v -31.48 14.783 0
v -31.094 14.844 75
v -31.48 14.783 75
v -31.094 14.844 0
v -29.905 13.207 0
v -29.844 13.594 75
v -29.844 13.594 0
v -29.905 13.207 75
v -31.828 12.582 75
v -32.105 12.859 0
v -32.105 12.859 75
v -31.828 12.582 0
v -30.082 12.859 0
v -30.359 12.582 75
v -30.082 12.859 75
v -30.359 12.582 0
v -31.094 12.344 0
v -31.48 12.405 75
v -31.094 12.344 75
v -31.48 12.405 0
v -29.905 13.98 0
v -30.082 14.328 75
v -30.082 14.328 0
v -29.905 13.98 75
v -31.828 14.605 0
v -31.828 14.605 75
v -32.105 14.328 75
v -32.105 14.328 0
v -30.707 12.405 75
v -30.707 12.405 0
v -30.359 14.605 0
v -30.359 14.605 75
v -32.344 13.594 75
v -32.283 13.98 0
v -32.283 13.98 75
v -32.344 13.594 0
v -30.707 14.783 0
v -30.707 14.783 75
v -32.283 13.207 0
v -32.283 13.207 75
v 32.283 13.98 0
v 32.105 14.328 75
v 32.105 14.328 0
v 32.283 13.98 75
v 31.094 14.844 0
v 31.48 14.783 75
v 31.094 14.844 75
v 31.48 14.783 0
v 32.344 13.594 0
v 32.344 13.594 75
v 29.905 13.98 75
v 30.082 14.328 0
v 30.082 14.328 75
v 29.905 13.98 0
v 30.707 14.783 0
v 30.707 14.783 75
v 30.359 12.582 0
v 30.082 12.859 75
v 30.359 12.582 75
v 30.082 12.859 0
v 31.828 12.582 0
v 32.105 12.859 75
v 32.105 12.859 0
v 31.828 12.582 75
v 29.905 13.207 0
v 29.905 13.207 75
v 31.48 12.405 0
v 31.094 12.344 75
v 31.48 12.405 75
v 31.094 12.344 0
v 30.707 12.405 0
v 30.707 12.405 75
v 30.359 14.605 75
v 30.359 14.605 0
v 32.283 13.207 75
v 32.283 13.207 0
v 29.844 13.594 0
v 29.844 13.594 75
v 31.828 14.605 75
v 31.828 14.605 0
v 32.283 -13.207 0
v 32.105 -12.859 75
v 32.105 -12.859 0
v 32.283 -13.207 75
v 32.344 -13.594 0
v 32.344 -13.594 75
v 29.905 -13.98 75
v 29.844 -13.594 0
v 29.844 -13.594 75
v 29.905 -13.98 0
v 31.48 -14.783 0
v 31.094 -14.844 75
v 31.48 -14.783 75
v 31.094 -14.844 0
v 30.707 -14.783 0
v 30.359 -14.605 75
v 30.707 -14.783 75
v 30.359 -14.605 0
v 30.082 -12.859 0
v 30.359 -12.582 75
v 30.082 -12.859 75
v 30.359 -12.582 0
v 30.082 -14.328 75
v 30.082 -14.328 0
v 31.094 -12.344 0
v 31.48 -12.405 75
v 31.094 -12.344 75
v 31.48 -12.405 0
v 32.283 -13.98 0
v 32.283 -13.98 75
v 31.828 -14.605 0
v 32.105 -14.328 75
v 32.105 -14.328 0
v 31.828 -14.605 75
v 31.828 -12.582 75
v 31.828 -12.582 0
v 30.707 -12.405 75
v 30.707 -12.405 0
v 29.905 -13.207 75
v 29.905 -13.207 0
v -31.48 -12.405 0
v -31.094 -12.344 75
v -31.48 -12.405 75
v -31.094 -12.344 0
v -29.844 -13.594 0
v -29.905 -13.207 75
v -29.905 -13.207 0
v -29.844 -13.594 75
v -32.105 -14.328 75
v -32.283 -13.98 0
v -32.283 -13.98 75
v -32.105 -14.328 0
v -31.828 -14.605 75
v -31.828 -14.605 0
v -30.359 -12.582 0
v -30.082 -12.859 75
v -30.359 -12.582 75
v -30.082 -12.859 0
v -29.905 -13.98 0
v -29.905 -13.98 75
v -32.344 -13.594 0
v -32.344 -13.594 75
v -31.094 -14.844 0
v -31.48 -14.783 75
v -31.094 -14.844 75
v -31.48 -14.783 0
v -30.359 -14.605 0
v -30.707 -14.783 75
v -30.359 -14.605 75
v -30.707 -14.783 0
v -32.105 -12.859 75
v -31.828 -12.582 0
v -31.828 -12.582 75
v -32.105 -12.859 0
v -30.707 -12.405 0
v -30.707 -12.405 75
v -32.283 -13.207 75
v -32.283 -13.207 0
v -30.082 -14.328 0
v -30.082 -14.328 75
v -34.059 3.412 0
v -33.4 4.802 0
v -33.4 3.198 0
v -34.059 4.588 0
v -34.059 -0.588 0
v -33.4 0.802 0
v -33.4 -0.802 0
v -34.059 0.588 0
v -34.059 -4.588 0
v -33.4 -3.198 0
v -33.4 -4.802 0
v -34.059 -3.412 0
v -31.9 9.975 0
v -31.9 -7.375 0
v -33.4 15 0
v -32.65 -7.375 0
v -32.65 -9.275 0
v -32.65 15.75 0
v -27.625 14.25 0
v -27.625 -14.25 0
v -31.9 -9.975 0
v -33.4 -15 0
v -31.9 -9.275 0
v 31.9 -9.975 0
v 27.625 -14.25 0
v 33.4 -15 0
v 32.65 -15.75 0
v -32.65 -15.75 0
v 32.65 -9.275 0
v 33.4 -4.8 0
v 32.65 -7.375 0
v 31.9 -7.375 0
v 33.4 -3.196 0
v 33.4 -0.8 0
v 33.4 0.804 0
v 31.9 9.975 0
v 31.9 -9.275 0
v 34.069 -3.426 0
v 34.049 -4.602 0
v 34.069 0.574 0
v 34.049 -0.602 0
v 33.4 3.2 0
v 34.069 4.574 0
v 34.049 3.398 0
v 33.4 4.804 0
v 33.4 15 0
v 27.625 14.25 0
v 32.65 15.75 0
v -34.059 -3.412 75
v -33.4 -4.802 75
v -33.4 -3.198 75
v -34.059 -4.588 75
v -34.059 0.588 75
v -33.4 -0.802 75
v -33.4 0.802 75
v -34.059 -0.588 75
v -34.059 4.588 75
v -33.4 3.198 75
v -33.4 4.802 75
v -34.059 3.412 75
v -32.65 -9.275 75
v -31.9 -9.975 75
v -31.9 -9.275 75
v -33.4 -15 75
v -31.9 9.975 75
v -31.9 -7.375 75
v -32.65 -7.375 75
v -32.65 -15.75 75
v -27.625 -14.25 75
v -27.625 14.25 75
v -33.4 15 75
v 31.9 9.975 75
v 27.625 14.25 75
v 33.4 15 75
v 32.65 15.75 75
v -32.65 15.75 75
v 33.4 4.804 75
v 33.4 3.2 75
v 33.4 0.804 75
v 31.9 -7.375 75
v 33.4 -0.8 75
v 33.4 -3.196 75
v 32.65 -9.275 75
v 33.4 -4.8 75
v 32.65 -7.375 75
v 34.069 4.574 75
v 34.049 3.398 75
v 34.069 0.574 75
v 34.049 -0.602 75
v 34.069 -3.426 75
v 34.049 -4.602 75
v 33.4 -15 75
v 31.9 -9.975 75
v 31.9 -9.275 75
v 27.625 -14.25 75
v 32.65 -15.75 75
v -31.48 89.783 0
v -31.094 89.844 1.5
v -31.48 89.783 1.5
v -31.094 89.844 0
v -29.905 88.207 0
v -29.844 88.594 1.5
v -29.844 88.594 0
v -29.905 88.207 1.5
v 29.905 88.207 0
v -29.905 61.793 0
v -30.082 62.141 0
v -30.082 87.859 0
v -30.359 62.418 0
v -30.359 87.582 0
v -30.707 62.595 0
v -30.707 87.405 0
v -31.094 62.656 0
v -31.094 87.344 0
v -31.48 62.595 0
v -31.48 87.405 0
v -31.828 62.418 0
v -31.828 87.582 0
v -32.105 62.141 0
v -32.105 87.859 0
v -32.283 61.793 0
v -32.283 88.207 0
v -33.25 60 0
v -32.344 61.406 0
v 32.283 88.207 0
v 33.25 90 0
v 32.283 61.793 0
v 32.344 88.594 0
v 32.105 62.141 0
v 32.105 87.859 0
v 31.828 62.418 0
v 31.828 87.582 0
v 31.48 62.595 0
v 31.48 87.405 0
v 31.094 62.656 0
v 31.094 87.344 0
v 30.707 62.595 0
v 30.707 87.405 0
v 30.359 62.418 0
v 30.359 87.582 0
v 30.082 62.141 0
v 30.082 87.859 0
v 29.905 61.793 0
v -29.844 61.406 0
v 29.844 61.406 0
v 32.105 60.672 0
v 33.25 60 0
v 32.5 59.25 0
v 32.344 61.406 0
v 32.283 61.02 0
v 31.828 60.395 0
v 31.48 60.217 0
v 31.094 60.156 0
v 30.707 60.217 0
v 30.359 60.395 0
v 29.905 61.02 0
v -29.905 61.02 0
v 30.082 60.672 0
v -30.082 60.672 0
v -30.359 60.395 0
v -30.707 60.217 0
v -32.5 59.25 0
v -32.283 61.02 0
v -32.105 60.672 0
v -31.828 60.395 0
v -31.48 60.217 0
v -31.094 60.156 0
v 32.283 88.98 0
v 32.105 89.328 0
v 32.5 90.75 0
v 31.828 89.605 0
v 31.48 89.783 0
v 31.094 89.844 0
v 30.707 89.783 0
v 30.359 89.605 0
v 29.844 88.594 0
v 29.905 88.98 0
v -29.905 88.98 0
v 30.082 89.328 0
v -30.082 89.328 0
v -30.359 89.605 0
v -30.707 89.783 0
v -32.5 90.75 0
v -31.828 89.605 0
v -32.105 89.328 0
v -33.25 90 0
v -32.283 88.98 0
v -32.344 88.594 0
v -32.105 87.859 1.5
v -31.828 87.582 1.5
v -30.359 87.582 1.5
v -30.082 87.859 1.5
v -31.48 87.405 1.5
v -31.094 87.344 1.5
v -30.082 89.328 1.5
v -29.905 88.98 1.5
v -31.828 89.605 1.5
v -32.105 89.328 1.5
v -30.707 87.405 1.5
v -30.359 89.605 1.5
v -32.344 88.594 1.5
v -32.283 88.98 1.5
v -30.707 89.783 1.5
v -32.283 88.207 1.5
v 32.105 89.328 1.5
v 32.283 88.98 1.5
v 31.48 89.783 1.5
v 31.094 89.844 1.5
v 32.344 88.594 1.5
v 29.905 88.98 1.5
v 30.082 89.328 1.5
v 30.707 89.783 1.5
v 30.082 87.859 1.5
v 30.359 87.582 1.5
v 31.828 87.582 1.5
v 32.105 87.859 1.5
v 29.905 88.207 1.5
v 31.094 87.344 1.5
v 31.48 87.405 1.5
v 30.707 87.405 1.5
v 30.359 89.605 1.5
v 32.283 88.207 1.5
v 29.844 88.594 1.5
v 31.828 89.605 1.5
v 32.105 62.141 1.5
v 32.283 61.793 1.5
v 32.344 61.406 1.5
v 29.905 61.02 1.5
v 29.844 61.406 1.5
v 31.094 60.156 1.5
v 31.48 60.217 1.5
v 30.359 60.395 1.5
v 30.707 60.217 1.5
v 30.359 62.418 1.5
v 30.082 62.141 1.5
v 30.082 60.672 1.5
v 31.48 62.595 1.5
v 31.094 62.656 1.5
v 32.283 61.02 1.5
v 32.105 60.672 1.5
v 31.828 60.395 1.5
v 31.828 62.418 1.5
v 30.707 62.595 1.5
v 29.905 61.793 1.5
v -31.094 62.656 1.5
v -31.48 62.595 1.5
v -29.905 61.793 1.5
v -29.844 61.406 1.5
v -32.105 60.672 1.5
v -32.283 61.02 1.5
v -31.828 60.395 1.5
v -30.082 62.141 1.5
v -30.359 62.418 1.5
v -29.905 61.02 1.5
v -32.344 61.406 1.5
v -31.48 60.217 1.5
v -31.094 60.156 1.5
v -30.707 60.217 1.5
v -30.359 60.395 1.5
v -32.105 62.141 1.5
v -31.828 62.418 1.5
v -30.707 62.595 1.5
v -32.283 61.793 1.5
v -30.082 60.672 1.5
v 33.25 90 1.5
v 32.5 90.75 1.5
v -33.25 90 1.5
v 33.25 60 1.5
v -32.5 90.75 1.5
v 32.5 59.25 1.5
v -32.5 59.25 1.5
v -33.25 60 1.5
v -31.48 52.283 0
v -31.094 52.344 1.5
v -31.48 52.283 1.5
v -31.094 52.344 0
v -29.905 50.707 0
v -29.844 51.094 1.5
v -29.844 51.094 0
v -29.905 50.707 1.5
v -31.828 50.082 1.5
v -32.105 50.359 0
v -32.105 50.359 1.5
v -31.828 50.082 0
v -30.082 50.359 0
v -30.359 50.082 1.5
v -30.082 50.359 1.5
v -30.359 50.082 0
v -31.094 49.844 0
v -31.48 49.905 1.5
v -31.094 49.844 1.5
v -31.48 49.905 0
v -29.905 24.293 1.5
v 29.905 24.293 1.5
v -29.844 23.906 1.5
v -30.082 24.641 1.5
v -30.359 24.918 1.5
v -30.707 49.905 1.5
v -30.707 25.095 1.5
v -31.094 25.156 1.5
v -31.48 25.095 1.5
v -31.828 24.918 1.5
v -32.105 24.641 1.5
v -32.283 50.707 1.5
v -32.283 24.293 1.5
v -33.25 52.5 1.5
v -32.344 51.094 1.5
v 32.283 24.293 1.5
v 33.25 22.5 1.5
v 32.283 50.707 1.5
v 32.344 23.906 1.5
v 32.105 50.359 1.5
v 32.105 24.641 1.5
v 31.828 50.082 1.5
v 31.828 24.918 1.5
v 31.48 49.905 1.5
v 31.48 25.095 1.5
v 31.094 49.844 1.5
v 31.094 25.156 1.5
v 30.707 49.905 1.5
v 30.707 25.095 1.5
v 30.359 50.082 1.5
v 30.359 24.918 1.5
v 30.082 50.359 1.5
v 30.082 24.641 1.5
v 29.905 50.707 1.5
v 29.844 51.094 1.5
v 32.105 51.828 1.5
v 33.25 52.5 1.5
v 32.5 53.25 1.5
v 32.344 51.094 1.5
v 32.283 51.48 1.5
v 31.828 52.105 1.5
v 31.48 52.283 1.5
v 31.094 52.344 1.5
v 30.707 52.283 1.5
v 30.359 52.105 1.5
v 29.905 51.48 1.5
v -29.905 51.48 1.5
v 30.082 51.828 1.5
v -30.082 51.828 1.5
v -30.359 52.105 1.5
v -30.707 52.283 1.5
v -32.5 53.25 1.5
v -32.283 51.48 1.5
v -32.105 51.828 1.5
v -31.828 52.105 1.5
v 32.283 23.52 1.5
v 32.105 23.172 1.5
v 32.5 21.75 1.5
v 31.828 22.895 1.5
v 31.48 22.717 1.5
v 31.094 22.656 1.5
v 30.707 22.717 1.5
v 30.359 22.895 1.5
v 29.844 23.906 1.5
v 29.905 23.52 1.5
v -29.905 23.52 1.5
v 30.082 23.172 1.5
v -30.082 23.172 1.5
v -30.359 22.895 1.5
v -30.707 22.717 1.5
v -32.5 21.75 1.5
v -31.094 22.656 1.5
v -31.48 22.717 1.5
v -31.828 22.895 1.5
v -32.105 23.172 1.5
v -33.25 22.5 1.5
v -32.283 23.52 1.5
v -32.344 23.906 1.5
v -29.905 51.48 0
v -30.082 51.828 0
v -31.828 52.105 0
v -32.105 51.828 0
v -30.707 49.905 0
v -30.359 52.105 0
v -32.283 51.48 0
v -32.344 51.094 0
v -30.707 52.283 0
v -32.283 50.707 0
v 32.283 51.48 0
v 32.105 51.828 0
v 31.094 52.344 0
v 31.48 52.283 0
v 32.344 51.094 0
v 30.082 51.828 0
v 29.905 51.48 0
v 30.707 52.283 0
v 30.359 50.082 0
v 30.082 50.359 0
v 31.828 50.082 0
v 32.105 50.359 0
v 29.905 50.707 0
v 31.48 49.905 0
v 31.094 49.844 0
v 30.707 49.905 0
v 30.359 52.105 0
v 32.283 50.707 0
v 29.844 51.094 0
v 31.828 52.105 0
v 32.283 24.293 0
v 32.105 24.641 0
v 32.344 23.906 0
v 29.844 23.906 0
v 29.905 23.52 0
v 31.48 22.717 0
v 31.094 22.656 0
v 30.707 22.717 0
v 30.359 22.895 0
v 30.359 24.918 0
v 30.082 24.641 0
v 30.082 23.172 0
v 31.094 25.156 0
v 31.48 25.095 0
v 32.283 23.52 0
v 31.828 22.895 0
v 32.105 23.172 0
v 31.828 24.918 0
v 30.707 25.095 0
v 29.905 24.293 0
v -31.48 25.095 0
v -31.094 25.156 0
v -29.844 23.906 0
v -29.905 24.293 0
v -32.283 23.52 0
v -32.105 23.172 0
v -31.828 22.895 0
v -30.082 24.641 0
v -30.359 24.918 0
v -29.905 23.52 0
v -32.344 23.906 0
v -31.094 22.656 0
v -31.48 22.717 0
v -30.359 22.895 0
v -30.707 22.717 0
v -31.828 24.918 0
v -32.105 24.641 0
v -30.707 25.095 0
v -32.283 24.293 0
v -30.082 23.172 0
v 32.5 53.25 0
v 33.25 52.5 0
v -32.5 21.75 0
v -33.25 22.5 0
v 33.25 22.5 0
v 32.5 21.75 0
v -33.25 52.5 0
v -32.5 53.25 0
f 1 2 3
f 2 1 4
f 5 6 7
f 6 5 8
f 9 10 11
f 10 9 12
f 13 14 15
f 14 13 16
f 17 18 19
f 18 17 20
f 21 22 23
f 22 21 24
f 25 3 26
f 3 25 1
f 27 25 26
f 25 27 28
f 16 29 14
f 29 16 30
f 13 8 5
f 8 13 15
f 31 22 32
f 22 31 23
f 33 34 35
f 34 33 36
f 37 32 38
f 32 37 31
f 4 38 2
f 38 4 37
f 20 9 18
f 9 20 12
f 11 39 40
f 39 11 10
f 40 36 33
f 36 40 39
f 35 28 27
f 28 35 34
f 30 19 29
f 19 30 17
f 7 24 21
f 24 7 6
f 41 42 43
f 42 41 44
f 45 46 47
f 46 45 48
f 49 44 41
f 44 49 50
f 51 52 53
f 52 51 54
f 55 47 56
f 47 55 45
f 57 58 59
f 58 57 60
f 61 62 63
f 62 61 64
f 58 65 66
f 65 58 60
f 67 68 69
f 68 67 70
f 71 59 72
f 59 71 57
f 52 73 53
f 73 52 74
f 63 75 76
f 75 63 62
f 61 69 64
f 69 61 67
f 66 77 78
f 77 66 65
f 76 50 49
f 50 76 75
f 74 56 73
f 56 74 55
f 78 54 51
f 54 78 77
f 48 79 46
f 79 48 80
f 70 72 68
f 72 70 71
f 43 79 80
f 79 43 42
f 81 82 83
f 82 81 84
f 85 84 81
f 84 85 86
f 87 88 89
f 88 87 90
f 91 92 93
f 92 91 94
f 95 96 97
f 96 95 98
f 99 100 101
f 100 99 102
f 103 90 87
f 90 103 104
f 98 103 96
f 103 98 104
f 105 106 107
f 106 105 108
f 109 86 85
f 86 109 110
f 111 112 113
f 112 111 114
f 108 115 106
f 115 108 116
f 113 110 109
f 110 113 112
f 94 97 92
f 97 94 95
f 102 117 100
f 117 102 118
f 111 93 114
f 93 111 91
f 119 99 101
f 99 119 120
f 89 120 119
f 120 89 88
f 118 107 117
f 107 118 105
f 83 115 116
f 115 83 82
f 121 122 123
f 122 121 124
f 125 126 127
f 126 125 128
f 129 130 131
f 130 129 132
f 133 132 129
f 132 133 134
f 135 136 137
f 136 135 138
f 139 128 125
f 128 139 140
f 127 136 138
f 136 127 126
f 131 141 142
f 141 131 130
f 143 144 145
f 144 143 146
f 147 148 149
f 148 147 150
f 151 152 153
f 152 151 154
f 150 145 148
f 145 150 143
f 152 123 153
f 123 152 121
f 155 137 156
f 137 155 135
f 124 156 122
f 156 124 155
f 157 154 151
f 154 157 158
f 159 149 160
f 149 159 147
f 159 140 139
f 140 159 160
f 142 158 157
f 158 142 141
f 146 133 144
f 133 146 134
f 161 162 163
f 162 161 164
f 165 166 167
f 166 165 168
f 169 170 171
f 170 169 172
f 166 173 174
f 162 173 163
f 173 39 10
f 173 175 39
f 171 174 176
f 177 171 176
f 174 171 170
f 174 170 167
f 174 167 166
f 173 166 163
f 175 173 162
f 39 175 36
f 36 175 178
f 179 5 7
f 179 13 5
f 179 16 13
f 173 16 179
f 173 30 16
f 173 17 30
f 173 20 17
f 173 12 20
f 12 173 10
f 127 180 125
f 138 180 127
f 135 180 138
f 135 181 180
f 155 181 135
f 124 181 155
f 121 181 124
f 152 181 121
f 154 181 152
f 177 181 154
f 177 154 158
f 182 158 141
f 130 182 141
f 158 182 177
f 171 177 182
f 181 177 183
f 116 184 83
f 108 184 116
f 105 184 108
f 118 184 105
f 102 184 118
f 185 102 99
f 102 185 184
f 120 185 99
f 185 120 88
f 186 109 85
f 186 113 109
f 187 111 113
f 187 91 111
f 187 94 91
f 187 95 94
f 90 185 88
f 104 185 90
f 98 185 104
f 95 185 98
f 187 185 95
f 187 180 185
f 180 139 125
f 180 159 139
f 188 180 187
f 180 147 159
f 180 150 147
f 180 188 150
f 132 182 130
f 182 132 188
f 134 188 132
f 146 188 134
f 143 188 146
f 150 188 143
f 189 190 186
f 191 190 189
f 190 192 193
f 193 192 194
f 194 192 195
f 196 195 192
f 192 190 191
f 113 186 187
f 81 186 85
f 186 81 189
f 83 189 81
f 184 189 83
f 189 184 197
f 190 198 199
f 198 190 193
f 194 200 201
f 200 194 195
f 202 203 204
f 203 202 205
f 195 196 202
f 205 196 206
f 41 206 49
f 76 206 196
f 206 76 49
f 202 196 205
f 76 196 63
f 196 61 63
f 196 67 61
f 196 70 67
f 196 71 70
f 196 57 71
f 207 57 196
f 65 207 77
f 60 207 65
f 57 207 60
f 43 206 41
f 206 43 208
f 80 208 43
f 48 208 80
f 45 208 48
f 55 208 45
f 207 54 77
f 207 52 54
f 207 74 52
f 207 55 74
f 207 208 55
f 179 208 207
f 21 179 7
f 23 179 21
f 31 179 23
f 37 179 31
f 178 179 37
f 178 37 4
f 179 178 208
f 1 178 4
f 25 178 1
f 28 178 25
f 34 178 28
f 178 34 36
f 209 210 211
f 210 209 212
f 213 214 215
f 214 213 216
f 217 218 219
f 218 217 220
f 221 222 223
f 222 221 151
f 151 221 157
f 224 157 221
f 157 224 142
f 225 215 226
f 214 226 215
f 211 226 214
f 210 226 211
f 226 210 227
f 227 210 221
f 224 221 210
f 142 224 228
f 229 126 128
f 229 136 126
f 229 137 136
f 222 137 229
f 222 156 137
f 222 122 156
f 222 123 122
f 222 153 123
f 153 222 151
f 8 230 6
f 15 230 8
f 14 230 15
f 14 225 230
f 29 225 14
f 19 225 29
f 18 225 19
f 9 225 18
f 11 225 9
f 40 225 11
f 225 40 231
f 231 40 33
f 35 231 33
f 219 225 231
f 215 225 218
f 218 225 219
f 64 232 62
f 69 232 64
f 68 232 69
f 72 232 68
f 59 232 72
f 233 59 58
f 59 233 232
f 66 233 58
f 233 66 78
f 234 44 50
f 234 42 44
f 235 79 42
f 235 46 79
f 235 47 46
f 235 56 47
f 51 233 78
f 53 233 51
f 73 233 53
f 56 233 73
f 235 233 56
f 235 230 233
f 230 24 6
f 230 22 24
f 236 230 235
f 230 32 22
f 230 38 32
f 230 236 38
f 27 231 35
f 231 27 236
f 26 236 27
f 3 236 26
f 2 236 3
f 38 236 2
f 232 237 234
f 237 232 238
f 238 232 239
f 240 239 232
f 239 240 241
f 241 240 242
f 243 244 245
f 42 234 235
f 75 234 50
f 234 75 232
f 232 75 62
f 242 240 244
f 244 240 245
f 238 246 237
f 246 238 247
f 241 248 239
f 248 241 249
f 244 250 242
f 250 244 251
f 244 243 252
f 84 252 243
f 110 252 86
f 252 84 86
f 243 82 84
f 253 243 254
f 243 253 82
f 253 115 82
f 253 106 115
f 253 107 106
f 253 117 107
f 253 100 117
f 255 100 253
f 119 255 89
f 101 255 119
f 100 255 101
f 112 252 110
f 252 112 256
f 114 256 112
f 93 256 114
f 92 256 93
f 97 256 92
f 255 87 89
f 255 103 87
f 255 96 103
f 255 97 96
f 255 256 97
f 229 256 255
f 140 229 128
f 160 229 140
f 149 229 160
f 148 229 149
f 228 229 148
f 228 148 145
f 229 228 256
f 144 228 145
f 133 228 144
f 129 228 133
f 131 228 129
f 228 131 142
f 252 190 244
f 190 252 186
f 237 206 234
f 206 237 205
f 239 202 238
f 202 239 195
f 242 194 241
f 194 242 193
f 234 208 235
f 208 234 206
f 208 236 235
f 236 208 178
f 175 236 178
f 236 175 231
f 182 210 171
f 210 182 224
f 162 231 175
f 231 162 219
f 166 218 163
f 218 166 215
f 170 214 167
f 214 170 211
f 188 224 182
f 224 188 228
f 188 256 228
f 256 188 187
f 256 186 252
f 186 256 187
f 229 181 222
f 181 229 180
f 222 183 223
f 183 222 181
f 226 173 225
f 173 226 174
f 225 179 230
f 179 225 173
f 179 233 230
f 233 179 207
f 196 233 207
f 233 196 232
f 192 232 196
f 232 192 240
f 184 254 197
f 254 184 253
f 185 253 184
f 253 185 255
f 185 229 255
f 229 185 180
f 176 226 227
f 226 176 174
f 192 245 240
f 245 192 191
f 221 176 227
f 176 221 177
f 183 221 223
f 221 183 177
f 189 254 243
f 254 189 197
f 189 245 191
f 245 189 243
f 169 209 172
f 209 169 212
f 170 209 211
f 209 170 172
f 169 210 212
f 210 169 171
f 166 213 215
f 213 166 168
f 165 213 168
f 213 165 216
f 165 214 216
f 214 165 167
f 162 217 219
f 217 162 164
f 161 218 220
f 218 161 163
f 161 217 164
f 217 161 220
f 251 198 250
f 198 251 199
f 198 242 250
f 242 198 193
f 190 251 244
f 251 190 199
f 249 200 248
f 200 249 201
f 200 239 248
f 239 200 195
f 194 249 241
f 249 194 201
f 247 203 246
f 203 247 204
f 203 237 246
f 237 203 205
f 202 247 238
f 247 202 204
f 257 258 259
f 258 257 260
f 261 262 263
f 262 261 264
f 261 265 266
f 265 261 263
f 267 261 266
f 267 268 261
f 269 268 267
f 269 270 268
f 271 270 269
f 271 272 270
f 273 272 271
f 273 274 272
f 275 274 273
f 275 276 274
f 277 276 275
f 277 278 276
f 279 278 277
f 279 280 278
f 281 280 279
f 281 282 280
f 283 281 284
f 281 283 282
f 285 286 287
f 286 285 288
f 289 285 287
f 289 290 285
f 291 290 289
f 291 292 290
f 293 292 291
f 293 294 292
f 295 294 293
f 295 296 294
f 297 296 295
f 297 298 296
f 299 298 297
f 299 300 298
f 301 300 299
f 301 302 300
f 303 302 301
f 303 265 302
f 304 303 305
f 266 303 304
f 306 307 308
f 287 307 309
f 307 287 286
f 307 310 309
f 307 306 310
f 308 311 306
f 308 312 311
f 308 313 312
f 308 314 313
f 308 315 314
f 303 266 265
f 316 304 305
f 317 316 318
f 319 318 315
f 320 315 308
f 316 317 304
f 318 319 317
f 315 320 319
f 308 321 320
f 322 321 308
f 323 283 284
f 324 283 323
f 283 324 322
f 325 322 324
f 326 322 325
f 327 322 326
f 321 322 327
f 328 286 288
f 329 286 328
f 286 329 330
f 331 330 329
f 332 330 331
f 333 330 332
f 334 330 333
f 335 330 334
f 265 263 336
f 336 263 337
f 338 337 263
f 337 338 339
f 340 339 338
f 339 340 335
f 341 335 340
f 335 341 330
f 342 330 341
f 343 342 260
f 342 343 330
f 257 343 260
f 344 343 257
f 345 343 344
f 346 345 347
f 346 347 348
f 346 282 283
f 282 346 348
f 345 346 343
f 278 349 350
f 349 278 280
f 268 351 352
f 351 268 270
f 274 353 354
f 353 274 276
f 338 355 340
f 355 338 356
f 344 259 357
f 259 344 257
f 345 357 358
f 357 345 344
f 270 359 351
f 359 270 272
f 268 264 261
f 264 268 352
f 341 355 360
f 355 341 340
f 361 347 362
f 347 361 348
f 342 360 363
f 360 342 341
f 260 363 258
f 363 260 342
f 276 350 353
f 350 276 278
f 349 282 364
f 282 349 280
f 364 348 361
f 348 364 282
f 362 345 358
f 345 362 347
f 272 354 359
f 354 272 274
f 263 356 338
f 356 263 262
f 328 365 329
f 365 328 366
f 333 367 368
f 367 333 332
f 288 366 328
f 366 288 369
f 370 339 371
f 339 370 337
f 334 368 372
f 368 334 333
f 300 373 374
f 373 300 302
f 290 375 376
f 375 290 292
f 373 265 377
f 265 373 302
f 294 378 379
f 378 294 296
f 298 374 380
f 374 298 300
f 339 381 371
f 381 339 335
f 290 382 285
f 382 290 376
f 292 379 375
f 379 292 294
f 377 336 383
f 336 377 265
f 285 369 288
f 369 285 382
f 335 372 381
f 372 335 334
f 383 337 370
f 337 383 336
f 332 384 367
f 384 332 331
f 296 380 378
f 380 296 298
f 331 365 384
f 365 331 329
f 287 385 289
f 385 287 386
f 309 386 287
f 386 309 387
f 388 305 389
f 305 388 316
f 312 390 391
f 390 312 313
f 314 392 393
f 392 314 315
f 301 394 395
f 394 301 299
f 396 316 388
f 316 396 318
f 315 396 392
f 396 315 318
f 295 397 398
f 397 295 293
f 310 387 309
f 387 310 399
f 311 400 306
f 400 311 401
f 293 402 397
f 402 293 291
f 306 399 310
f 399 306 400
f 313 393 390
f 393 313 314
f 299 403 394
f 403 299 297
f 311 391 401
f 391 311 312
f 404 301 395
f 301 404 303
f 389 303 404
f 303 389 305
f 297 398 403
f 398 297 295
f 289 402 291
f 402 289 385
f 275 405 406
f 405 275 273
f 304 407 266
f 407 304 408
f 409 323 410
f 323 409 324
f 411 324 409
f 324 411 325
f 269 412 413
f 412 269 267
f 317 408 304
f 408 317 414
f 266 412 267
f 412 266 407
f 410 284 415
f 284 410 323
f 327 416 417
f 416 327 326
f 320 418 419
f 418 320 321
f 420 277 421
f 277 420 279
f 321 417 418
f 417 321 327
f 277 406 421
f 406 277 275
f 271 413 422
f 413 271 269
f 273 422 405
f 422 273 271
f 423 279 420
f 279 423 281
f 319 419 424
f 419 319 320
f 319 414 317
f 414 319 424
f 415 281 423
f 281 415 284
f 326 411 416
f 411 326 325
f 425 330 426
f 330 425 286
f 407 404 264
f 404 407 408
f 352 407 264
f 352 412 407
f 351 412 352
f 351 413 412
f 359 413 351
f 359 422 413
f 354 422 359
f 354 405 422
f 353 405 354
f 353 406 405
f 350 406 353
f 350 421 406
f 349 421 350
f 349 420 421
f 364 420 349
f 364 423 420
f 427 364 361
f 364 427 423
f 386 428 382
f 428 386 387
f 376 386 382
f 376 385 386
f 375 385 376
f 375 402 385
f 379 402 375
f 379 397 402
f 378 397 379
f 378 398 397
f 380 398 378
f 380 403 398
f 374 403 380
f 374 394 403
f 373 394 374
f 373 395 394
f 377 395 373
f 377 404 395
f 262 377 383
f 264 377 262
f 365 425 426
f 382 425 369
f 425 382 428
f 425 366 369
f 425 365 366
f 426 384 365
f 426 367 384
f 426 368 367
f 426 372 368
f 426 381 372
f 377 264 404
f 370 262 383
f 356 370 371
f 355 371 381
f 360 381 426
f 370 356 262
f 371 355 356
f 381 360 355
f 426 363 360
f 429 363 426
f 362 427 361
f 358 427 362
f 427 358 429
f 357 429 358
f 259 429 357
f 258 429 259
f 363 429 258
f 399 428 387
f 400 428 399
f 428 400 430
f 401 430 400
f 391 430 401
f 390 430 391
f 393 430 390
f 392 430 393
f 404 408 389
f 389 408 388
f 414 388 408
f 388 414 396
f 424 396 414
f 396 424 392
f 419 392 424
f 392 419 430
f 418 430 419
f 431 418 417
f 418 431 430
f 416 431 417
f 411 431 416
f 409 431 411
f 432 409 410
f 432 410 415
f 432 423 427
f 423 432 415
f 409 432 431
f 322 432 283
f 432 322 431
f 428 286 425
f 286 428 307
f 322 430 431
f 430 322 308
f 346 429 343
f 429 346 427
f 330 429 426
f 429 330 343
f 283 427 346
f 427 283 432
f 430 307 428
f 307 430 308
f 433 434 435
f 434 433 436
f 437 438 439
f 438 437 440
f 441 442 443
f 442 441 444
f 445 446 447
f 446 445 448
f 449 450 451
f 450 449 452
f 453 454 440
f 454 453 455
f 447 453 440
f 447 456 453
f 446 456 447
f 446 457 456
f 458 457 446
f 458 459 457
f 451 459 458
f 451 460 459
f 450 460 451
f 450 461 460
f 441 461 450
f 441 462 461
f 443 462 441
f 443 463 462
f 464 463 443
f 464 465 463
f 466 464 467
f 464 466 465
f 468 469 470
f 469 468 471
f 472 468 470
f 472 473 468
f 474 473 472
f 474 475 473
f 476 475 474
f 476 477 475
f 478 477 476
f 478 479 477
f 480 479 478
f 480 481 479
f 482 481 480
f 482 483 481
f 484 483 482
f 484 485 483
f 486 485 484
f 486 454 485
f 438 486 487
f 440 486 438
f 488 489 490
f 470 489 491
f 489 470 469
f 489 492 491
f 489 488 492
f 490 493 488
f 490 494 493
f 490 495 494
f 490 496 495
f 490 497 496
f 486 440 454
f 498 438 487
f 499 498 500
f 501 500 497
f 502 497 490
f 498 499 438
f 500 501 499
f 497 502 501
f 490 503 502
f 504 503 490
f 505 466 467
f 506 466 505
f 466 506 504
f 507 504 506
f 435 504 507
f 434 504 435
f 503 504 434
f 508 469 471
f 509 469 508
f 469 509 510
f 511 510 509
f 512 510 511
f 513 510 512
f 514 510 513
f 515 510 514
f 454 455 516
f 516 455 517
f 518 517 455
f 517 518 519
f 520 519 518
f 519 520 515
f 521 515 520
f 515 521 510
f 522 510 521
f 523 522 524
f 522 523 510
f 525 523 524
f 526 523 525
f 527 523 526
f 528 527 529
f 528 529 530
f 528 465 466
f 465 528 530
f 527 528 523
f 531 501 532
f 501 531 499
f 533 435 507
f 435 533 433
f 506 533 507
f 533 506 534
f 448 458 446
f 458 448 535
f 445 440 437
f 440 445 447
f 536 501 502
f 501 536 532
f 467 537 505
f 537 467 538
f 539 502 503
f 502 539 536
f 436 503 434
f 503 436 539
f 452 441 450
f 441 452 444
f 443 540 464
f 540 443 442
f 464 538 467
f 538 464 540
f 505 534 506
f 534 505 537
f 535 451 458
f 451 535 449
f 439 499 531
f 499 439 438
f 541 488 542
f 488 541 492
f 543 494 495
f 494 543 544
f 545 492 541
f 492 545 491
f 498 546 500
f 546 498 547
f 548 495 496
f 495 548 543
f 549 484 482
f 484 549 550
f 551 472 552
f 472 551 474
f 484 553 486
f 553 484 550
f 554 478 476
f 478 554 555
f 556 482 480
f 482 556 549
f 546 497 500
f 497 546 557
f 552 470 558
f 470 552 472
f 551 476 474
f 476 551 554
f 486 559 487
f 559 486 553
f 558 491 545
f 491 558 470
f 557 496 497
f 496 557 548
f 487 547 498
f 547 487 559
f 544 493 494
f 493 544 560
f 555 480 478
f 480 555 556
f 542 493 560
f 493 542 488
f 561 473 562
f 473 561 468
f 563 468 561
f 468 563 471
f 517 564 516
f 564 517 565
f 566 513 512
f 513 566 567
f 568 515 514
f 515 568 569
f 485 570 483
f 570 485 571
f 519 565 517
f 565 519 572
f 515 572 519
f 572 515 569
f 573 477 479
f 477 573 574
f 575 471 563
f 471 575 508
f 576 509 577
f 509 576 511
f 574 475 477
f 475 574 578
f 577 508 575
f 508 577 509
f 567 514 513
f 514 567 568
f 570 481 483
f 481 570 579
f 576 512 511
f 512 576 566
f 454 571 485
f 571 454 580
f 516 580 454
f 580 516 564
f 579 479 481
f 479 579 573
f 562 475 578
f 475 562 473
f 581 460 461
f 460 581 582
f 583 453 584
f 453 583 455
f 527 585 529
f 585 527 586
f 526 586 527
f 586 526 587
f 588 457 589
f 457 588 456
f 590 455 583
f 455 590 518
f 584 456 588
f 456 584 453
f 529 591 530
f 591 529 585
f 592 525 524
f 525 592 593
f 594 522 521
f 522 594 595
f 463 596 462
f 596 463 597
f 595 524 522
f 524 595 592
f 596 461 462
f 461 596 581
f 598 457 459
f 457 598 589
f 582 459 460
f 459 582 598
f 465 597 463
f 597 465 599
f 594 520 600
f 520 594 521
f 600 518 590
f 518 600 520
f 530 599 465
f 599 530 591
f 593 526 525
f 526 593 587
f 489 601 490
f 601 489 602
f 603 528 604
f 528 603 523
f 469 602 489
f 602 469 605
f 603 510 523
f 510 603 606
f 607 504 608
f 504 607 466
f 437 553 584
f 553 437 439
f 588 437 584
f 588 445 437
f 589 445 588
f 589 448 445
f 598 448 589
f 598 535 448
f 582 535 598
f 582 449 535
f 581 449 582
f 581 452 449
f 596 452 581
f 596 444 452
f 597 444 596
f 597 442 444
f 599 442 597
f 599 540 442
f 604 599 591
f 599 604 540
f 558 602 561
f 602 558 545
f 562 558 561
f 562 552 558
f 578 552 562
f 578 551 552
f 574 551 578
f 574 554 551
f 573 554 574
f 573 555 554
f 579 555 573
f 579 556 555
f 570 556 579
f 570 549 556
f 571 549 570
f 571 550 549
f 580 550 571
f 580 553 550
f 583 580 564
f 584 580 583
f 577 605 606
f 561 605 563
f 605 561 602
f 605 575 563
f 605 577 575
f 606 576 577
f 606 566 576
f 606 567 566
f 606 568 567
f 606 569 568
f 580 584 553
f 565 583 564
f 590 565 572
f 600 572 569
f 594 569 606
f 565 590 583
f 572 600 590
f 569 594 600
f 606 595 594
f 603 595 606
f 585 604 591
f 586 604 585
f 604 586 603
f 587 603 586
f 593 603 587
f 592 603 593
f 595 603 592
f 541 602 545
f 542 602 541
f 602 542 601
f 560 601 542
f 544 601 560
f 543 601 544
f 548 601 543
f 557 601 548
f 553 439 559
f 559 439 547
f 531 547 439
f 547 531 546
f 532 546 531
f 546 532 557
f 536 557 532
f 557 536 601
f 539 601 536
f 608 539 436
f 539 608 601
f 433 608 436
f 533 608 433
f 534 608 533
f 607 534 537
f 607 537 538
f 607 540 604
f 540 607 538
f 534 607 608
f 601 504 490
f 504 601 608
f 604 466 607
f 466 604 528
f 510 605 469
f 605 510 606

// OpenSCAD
// preview[view:south east, tilt:top diagonal]

/* [Basic Settings] */
case_type = "custom"; // [arduino:Arduino Uno,custom:Custom]
feet = "none"; // [raised:Raised,mag:Magnetic,hole:Holes,wing:Wings,none:None]
attachment_type = "nothread"; // [hotinsert:Hot Insert,nothread:Undersized Hole]
rib_type = "outer"; // [inner:Inner,outer:Outer,none:None]
bolt_size = 2.5; // [2.5:2.5mm,3:3mm,4:4mm]

/* [Case Options] */
// Include a slot for the PCB at the bottom of the case
bottom_board_cutout = "include"; // [include:Include,exclude:Exclude]
// Add an extra slot for a PCB at the top of the case
top_board_cutout = "exclude"; // [include:Include,exclude:Exclude]
// Add an extra slot for a PCB at mid-height
middle_board_cutout = "exclude"; // [include:Include,exclude:Exclude]
// Include the top of the case
top_cap = "include"; // [include:Include,exclude:Exclude]
// Include the two end caps
end_caps = "include"; // [include:Include,exclude:Exclude]
// Include vents in the top of the case (if available)
vents = "exclude"; // [include:Include,exclude:Exclude]

/* [Custom PCB Dimensions] */
// PCB width in mm
custom_width = 65;
// Case height above PCB in mm
custom_height = 30;
// PCB length in mm
custom_length = 75;
// PCB thickness in mm
pcb_height = 1.6; // Height of all PCB's in mm

/* [Print Details] */
// Wall thickness in mm
wall = 1.5; 
// Percent of shrink in non-threaded holes
hole_shrink = 0.85; 
// Clearance in mm around X, Y and Z of PCB cutouts
pcb_clearance = 0.3; // The clearance amount for the PCB in mm
// Clearance in mm around hot insert holes
hot_insert_clearance = 0.25; // The clearance amount for hot inserts in mm

/* [Hidden] */
hole = bolt_size/2;
fillet = hole * (attachment_type == "hotinsert" ? 4.5 : 4.5);
width = custom_width;
height = custom_height;
length = custom_length;
width = case_type == "arduino" ? 53.50 : custom_width;
height = case_type == "arduino" ? 30 : custom_height;
length = case_type == "arduino" ? 68.7 : custom_length;

color("orange")
union() {
  if (feet == "raised") {
    rotate([90,0,180]) 
      translate([width/2-10,length-10,-(height/2)-wall-1])
      cylinder(h=2, r1=2.5, r2=5, center=false, $fn = 20);
    rotate([90,0,180]) 
      translate([-width/2+10,length-10,-(height/2)-wall-1])
      cylinder(h=2, r1=2.5, r2=5, center=false, $fn = 20);
    rotate([90,0,180]) 
      translate([width/2-10,10,-(height/2)-wall-1])
      cylinder(h=2, r1=2.5, r2=5, center=false, $fn = 20);
    rotate([90,0,180]) 
      translate([-width/2+10,10,-(height/2)-wall-1])
      cylinder(h=2, r1=2.5, r2=5, center=false, $fn = 20);
  }
  else if (feet == "mag") {
    difference() {
      rotate([90,0,180]) 
        translate([width/2-10,length-10,-(height/2)-wall-1])
        cylinder(h=2, r1=3, r2=5, center=false, $fn = 20);
      
      rotate([90,0,180]) 
        translate([width/2-10,length-10,-(height/2)-wall])
        cylinder(2,2.75,2.75,true, $fn = 20);
    }
    difference() {
      rotate([90,0,180]) 
        translate([-width/2+10,length-10,-(height/2)-wall-1])
        cylinder(h=2, r1=3, r2=5, center=false, $fn = 20);
      
      rotate([90,0,180]) 
        translate([-width/2+10,length-10,-(height/2)-wall])
        cylinder(2,2.75,2.75,true, $fn = 20);
    }
    difference() {
      rotate([90,0,180]) 
        translate([width/2-10,10,-(height/2)-wall-1])
        cylinder(h=2, r1=3, r2=5, center=false, $fn = 20);
      
      rotate([90,0,180]) 
        translate([width/2-10,10,-(height/2)-wall])
        cylinder(2,2.75,2.75,true, $fn = 20);
    }
    difference() {
      rotate([90,0,180]) 
        translate([-width/2+10,10,-(height/2)-wall-1])
        cylinder(h=2, r1=3, r2=5, center=false, $fn = 20);
      
      rotate([90,0,180]) 
        translate([-width/2+10,10,-(height/2)-wall])
        cylinder(2,2.75,2.75,true, $fn = 20);
    }
  }
  else if (feet == "wing") {
    translate([width/2,-height/2-wall/2,0])
      difference() {
        cube(size = [8,wall,length]);
        translate([4,0,10])
          rotate([90,90,0])
          cylinder(200,hole,hole,true,$fn=20);
        translate([4,0,length-10])
          rotate([90,90,0])
          cylinder(200,hole,hole,true,$fn=20);
      }
    translate([-(width/2)-8,-height/2-wall/2,0])
      difference() {
        cube(size = [8,wall,length]);
        translate([4,0,10])
          rotate([90,90,0])
          cylinder(200,hole,hole,true,$fn=20);
        translate([4,0,length-10])
          rotate([90,90,0])
          cylinder(200,hole,hole,true,$fn=20);
      }
  }

  difference() {
    linear_extrude(length) {
     // Draw two squares and offset to shell
     difference() {
        offset(r = (wall/2)) {
            square([width+pcb_clearance,height], center = true);
        }
        offset(delta = -(wall/2), chamfer = true) {
            square([width+pcb_clearance,height], center = true);
        }        
      }
      
      // Draw the corners for the attachment holes
      polygon(points=
        [[-(width/2)+fillet,(height/2)],
        [-(width/2),(height/2)-fillet],
        [-(width/2),(height/2)]]
      );
      polygon(points=
        [[(width/2)-fillet,-(height/2)],
        [(width/2),-(height/2)+fillet],
        [(width/2),-(height/2)]]
      );
      polygon(points=
        [[(width/2)-fillet,(height/2)],
        [(width/2),(height/2)-fillet],
        [(width/2),(height/2)]]
      );
      polygon(points=
        [[-(width/2)+fillet,-(height/2)],
        [-(width/2),-(height/2)+fillet],
        [-(width/2),-(height/2)]]
      );          
    }
    
    // Drill the holes for the attachment points, size depends on type
    if (attachment_type == "hotinsert")   
      drill_holes(hole+hot_insert_clearance);  
    else if (attachment_type == "undersize") 
      drill_holes(hole*hole_shrink);  
    else
      drill_holes(hole);
    
    // Carve out the inner ribs
    if (rib_type == "inner")
        make_ribs();  
    
    // Extrude the bottom board for later difference
    if (bottom_board_cutout) {
      translate([0,-(height/2-fillet-2),length/2])
        rotate([90,0,0]) {
          linear_extrude(pcb_height+pcb_clearance) {  
            square([width+pcb_clearance,length+pcb_clearance], center=true);
          }
        }
    }
    
    // Extrude the top board for later difference
    if (top_board_cutout == "include") {
      translate([0,(height/2-fillet-2),length/2])
        rotate([90,0,0]) {
          linear_extrude(pcb_height+pcb_clearance) {  
            square([width+pcb_clearance,length+pcb_clearance], center=true);
          }
        }
    }  
    
    // Extrude the middle board for later difference
    if (middle_board_cutout == "include") {
    translate([0,0,length/2])
      rotate([90,0,0]) {
        linear_extrude(pcb_height+pcb_clearance) {  
          square([width+pcb_clearance,length+pcb_clearance], center=true);
        }
      }
    }
    
    // Remove the top if selected
    if (top_cap == "exclude") {
      translate([0,(height/2)+(wall/2)+1,length/2]) {
        rotate([90,0,0]) {
          linear_extrude(wall+2) {  
            square([width-(fillet+(wall/2)*2),length], center=true);
          }
        }
      }
    }    
    
    // Make holes feet if selected
    if (feet == "hole") {        
      rotate([90,0,180]) 
        translate([width/2-10,length-10,-(height/2)-0])
        cylinder(5,hole,hole,true, $fn = 20, $fn = 20);
      rotate([90,0,180]) 
        translate([-width/2+10,length-10,-(height/2)-wall])
        cylinder(5,hole,hole,true, $fn = 20, $fn = 20);
      rotate([90,0,180]) 
        translate([width/2-10,10,-(height/2)-wall])
        cylinder(5,hole,hole,true, $fn = 20, $fn = 20);
      rotate([90,0,180]) 
        translate([-width/2+10,10,-(height/2)-wall])
        cylinder(5,hole,hole,true, $fn = 20, $fn = 20);
    }  
    
    if (vents == "include") {
      for (a =[0:4]) {
        translate([-(width/5)+(a*(width/11)),10,height/3])
        cube([2,10,length*.66]);
      }
    }      
  }

  // Extrude ribs if selected
  if (rib_type == "outer")
      make_ribs();  
}

color("gray")
if (end_caps == "include") {
  translate([0,height*2.50,wall])
  difference() {
    translate([0,0,-wall])
    linear_extrude(wall) {
      offset(r = (wall/2)) {
          square([width,height], center = true);
      }
    }
    drill_holes(hole);
    if (case_type == "arduino") {
      translate([width/2-5.5-9.8,-(height/2-fillet-2)+5.5,0])
        cube(size = [12.5,11,10], center = true);
      translate([-width/2+4.5+3.3,-(height/2-fillet-2)+5.5,0])
        cube(size = [9,11,10], center = true);
    }
  }
  
  translate([0,height*1.25,-length])
  difference() {
    translate([0,0,length])
    linear_extrude(wall) {
      offset(r = (wall/2)) {
          square([width,height], center = true);
      }
    }
    drill_holes(hole);
  }
}

module make_ribs() {  
  rib_count = height >= 40 ? 2 : 1;

  if (rib_count > 0) {
    for (a =[-rib_count:rib_count]) {
      linear_extrude(length) {
        translate([-(width/2)-wall/2,4*a,0])
        circle(1, $fn = 5);
      }
    }
    
    for (a =[-rib_count:rib_count]) {
      linear_extrude(length) {        
        translate([(width/2)+wall/2,4*a,0])
        rotate([0,0,35])
        circle(1, $fn = 5);
      }
    }
  }
}

module drill_holes(drill_size) {    
  echo(drill_size);
  translate([0,0,-wall]) {
    linear_extrude(length+wall*2) {
      translate([-(width/2)+fillet/4,(height/2)-fillet/4,0])
      circle(drill_size, $fn = 20);
    }
    
    linear_extrude(length+wall*2) {
      translate([(width/2)-fillet/4,(height/2)-fillet/4,0])
      circle(drill_size, $fn = 20);
    }
    linear_extrude(length+wall*2) {
      translate([(width/2)-fillet/4,-(height/2)+fillet/4,0])
      circle(drill_size, $fn = 20);
    }
    linear_extrude(length+wall*2) {
      translate([-(width/2)+fillet/4,-(height/2)+fillet/4,0])
      circle(drill_size, $fn = 20);
    }
  }
}
